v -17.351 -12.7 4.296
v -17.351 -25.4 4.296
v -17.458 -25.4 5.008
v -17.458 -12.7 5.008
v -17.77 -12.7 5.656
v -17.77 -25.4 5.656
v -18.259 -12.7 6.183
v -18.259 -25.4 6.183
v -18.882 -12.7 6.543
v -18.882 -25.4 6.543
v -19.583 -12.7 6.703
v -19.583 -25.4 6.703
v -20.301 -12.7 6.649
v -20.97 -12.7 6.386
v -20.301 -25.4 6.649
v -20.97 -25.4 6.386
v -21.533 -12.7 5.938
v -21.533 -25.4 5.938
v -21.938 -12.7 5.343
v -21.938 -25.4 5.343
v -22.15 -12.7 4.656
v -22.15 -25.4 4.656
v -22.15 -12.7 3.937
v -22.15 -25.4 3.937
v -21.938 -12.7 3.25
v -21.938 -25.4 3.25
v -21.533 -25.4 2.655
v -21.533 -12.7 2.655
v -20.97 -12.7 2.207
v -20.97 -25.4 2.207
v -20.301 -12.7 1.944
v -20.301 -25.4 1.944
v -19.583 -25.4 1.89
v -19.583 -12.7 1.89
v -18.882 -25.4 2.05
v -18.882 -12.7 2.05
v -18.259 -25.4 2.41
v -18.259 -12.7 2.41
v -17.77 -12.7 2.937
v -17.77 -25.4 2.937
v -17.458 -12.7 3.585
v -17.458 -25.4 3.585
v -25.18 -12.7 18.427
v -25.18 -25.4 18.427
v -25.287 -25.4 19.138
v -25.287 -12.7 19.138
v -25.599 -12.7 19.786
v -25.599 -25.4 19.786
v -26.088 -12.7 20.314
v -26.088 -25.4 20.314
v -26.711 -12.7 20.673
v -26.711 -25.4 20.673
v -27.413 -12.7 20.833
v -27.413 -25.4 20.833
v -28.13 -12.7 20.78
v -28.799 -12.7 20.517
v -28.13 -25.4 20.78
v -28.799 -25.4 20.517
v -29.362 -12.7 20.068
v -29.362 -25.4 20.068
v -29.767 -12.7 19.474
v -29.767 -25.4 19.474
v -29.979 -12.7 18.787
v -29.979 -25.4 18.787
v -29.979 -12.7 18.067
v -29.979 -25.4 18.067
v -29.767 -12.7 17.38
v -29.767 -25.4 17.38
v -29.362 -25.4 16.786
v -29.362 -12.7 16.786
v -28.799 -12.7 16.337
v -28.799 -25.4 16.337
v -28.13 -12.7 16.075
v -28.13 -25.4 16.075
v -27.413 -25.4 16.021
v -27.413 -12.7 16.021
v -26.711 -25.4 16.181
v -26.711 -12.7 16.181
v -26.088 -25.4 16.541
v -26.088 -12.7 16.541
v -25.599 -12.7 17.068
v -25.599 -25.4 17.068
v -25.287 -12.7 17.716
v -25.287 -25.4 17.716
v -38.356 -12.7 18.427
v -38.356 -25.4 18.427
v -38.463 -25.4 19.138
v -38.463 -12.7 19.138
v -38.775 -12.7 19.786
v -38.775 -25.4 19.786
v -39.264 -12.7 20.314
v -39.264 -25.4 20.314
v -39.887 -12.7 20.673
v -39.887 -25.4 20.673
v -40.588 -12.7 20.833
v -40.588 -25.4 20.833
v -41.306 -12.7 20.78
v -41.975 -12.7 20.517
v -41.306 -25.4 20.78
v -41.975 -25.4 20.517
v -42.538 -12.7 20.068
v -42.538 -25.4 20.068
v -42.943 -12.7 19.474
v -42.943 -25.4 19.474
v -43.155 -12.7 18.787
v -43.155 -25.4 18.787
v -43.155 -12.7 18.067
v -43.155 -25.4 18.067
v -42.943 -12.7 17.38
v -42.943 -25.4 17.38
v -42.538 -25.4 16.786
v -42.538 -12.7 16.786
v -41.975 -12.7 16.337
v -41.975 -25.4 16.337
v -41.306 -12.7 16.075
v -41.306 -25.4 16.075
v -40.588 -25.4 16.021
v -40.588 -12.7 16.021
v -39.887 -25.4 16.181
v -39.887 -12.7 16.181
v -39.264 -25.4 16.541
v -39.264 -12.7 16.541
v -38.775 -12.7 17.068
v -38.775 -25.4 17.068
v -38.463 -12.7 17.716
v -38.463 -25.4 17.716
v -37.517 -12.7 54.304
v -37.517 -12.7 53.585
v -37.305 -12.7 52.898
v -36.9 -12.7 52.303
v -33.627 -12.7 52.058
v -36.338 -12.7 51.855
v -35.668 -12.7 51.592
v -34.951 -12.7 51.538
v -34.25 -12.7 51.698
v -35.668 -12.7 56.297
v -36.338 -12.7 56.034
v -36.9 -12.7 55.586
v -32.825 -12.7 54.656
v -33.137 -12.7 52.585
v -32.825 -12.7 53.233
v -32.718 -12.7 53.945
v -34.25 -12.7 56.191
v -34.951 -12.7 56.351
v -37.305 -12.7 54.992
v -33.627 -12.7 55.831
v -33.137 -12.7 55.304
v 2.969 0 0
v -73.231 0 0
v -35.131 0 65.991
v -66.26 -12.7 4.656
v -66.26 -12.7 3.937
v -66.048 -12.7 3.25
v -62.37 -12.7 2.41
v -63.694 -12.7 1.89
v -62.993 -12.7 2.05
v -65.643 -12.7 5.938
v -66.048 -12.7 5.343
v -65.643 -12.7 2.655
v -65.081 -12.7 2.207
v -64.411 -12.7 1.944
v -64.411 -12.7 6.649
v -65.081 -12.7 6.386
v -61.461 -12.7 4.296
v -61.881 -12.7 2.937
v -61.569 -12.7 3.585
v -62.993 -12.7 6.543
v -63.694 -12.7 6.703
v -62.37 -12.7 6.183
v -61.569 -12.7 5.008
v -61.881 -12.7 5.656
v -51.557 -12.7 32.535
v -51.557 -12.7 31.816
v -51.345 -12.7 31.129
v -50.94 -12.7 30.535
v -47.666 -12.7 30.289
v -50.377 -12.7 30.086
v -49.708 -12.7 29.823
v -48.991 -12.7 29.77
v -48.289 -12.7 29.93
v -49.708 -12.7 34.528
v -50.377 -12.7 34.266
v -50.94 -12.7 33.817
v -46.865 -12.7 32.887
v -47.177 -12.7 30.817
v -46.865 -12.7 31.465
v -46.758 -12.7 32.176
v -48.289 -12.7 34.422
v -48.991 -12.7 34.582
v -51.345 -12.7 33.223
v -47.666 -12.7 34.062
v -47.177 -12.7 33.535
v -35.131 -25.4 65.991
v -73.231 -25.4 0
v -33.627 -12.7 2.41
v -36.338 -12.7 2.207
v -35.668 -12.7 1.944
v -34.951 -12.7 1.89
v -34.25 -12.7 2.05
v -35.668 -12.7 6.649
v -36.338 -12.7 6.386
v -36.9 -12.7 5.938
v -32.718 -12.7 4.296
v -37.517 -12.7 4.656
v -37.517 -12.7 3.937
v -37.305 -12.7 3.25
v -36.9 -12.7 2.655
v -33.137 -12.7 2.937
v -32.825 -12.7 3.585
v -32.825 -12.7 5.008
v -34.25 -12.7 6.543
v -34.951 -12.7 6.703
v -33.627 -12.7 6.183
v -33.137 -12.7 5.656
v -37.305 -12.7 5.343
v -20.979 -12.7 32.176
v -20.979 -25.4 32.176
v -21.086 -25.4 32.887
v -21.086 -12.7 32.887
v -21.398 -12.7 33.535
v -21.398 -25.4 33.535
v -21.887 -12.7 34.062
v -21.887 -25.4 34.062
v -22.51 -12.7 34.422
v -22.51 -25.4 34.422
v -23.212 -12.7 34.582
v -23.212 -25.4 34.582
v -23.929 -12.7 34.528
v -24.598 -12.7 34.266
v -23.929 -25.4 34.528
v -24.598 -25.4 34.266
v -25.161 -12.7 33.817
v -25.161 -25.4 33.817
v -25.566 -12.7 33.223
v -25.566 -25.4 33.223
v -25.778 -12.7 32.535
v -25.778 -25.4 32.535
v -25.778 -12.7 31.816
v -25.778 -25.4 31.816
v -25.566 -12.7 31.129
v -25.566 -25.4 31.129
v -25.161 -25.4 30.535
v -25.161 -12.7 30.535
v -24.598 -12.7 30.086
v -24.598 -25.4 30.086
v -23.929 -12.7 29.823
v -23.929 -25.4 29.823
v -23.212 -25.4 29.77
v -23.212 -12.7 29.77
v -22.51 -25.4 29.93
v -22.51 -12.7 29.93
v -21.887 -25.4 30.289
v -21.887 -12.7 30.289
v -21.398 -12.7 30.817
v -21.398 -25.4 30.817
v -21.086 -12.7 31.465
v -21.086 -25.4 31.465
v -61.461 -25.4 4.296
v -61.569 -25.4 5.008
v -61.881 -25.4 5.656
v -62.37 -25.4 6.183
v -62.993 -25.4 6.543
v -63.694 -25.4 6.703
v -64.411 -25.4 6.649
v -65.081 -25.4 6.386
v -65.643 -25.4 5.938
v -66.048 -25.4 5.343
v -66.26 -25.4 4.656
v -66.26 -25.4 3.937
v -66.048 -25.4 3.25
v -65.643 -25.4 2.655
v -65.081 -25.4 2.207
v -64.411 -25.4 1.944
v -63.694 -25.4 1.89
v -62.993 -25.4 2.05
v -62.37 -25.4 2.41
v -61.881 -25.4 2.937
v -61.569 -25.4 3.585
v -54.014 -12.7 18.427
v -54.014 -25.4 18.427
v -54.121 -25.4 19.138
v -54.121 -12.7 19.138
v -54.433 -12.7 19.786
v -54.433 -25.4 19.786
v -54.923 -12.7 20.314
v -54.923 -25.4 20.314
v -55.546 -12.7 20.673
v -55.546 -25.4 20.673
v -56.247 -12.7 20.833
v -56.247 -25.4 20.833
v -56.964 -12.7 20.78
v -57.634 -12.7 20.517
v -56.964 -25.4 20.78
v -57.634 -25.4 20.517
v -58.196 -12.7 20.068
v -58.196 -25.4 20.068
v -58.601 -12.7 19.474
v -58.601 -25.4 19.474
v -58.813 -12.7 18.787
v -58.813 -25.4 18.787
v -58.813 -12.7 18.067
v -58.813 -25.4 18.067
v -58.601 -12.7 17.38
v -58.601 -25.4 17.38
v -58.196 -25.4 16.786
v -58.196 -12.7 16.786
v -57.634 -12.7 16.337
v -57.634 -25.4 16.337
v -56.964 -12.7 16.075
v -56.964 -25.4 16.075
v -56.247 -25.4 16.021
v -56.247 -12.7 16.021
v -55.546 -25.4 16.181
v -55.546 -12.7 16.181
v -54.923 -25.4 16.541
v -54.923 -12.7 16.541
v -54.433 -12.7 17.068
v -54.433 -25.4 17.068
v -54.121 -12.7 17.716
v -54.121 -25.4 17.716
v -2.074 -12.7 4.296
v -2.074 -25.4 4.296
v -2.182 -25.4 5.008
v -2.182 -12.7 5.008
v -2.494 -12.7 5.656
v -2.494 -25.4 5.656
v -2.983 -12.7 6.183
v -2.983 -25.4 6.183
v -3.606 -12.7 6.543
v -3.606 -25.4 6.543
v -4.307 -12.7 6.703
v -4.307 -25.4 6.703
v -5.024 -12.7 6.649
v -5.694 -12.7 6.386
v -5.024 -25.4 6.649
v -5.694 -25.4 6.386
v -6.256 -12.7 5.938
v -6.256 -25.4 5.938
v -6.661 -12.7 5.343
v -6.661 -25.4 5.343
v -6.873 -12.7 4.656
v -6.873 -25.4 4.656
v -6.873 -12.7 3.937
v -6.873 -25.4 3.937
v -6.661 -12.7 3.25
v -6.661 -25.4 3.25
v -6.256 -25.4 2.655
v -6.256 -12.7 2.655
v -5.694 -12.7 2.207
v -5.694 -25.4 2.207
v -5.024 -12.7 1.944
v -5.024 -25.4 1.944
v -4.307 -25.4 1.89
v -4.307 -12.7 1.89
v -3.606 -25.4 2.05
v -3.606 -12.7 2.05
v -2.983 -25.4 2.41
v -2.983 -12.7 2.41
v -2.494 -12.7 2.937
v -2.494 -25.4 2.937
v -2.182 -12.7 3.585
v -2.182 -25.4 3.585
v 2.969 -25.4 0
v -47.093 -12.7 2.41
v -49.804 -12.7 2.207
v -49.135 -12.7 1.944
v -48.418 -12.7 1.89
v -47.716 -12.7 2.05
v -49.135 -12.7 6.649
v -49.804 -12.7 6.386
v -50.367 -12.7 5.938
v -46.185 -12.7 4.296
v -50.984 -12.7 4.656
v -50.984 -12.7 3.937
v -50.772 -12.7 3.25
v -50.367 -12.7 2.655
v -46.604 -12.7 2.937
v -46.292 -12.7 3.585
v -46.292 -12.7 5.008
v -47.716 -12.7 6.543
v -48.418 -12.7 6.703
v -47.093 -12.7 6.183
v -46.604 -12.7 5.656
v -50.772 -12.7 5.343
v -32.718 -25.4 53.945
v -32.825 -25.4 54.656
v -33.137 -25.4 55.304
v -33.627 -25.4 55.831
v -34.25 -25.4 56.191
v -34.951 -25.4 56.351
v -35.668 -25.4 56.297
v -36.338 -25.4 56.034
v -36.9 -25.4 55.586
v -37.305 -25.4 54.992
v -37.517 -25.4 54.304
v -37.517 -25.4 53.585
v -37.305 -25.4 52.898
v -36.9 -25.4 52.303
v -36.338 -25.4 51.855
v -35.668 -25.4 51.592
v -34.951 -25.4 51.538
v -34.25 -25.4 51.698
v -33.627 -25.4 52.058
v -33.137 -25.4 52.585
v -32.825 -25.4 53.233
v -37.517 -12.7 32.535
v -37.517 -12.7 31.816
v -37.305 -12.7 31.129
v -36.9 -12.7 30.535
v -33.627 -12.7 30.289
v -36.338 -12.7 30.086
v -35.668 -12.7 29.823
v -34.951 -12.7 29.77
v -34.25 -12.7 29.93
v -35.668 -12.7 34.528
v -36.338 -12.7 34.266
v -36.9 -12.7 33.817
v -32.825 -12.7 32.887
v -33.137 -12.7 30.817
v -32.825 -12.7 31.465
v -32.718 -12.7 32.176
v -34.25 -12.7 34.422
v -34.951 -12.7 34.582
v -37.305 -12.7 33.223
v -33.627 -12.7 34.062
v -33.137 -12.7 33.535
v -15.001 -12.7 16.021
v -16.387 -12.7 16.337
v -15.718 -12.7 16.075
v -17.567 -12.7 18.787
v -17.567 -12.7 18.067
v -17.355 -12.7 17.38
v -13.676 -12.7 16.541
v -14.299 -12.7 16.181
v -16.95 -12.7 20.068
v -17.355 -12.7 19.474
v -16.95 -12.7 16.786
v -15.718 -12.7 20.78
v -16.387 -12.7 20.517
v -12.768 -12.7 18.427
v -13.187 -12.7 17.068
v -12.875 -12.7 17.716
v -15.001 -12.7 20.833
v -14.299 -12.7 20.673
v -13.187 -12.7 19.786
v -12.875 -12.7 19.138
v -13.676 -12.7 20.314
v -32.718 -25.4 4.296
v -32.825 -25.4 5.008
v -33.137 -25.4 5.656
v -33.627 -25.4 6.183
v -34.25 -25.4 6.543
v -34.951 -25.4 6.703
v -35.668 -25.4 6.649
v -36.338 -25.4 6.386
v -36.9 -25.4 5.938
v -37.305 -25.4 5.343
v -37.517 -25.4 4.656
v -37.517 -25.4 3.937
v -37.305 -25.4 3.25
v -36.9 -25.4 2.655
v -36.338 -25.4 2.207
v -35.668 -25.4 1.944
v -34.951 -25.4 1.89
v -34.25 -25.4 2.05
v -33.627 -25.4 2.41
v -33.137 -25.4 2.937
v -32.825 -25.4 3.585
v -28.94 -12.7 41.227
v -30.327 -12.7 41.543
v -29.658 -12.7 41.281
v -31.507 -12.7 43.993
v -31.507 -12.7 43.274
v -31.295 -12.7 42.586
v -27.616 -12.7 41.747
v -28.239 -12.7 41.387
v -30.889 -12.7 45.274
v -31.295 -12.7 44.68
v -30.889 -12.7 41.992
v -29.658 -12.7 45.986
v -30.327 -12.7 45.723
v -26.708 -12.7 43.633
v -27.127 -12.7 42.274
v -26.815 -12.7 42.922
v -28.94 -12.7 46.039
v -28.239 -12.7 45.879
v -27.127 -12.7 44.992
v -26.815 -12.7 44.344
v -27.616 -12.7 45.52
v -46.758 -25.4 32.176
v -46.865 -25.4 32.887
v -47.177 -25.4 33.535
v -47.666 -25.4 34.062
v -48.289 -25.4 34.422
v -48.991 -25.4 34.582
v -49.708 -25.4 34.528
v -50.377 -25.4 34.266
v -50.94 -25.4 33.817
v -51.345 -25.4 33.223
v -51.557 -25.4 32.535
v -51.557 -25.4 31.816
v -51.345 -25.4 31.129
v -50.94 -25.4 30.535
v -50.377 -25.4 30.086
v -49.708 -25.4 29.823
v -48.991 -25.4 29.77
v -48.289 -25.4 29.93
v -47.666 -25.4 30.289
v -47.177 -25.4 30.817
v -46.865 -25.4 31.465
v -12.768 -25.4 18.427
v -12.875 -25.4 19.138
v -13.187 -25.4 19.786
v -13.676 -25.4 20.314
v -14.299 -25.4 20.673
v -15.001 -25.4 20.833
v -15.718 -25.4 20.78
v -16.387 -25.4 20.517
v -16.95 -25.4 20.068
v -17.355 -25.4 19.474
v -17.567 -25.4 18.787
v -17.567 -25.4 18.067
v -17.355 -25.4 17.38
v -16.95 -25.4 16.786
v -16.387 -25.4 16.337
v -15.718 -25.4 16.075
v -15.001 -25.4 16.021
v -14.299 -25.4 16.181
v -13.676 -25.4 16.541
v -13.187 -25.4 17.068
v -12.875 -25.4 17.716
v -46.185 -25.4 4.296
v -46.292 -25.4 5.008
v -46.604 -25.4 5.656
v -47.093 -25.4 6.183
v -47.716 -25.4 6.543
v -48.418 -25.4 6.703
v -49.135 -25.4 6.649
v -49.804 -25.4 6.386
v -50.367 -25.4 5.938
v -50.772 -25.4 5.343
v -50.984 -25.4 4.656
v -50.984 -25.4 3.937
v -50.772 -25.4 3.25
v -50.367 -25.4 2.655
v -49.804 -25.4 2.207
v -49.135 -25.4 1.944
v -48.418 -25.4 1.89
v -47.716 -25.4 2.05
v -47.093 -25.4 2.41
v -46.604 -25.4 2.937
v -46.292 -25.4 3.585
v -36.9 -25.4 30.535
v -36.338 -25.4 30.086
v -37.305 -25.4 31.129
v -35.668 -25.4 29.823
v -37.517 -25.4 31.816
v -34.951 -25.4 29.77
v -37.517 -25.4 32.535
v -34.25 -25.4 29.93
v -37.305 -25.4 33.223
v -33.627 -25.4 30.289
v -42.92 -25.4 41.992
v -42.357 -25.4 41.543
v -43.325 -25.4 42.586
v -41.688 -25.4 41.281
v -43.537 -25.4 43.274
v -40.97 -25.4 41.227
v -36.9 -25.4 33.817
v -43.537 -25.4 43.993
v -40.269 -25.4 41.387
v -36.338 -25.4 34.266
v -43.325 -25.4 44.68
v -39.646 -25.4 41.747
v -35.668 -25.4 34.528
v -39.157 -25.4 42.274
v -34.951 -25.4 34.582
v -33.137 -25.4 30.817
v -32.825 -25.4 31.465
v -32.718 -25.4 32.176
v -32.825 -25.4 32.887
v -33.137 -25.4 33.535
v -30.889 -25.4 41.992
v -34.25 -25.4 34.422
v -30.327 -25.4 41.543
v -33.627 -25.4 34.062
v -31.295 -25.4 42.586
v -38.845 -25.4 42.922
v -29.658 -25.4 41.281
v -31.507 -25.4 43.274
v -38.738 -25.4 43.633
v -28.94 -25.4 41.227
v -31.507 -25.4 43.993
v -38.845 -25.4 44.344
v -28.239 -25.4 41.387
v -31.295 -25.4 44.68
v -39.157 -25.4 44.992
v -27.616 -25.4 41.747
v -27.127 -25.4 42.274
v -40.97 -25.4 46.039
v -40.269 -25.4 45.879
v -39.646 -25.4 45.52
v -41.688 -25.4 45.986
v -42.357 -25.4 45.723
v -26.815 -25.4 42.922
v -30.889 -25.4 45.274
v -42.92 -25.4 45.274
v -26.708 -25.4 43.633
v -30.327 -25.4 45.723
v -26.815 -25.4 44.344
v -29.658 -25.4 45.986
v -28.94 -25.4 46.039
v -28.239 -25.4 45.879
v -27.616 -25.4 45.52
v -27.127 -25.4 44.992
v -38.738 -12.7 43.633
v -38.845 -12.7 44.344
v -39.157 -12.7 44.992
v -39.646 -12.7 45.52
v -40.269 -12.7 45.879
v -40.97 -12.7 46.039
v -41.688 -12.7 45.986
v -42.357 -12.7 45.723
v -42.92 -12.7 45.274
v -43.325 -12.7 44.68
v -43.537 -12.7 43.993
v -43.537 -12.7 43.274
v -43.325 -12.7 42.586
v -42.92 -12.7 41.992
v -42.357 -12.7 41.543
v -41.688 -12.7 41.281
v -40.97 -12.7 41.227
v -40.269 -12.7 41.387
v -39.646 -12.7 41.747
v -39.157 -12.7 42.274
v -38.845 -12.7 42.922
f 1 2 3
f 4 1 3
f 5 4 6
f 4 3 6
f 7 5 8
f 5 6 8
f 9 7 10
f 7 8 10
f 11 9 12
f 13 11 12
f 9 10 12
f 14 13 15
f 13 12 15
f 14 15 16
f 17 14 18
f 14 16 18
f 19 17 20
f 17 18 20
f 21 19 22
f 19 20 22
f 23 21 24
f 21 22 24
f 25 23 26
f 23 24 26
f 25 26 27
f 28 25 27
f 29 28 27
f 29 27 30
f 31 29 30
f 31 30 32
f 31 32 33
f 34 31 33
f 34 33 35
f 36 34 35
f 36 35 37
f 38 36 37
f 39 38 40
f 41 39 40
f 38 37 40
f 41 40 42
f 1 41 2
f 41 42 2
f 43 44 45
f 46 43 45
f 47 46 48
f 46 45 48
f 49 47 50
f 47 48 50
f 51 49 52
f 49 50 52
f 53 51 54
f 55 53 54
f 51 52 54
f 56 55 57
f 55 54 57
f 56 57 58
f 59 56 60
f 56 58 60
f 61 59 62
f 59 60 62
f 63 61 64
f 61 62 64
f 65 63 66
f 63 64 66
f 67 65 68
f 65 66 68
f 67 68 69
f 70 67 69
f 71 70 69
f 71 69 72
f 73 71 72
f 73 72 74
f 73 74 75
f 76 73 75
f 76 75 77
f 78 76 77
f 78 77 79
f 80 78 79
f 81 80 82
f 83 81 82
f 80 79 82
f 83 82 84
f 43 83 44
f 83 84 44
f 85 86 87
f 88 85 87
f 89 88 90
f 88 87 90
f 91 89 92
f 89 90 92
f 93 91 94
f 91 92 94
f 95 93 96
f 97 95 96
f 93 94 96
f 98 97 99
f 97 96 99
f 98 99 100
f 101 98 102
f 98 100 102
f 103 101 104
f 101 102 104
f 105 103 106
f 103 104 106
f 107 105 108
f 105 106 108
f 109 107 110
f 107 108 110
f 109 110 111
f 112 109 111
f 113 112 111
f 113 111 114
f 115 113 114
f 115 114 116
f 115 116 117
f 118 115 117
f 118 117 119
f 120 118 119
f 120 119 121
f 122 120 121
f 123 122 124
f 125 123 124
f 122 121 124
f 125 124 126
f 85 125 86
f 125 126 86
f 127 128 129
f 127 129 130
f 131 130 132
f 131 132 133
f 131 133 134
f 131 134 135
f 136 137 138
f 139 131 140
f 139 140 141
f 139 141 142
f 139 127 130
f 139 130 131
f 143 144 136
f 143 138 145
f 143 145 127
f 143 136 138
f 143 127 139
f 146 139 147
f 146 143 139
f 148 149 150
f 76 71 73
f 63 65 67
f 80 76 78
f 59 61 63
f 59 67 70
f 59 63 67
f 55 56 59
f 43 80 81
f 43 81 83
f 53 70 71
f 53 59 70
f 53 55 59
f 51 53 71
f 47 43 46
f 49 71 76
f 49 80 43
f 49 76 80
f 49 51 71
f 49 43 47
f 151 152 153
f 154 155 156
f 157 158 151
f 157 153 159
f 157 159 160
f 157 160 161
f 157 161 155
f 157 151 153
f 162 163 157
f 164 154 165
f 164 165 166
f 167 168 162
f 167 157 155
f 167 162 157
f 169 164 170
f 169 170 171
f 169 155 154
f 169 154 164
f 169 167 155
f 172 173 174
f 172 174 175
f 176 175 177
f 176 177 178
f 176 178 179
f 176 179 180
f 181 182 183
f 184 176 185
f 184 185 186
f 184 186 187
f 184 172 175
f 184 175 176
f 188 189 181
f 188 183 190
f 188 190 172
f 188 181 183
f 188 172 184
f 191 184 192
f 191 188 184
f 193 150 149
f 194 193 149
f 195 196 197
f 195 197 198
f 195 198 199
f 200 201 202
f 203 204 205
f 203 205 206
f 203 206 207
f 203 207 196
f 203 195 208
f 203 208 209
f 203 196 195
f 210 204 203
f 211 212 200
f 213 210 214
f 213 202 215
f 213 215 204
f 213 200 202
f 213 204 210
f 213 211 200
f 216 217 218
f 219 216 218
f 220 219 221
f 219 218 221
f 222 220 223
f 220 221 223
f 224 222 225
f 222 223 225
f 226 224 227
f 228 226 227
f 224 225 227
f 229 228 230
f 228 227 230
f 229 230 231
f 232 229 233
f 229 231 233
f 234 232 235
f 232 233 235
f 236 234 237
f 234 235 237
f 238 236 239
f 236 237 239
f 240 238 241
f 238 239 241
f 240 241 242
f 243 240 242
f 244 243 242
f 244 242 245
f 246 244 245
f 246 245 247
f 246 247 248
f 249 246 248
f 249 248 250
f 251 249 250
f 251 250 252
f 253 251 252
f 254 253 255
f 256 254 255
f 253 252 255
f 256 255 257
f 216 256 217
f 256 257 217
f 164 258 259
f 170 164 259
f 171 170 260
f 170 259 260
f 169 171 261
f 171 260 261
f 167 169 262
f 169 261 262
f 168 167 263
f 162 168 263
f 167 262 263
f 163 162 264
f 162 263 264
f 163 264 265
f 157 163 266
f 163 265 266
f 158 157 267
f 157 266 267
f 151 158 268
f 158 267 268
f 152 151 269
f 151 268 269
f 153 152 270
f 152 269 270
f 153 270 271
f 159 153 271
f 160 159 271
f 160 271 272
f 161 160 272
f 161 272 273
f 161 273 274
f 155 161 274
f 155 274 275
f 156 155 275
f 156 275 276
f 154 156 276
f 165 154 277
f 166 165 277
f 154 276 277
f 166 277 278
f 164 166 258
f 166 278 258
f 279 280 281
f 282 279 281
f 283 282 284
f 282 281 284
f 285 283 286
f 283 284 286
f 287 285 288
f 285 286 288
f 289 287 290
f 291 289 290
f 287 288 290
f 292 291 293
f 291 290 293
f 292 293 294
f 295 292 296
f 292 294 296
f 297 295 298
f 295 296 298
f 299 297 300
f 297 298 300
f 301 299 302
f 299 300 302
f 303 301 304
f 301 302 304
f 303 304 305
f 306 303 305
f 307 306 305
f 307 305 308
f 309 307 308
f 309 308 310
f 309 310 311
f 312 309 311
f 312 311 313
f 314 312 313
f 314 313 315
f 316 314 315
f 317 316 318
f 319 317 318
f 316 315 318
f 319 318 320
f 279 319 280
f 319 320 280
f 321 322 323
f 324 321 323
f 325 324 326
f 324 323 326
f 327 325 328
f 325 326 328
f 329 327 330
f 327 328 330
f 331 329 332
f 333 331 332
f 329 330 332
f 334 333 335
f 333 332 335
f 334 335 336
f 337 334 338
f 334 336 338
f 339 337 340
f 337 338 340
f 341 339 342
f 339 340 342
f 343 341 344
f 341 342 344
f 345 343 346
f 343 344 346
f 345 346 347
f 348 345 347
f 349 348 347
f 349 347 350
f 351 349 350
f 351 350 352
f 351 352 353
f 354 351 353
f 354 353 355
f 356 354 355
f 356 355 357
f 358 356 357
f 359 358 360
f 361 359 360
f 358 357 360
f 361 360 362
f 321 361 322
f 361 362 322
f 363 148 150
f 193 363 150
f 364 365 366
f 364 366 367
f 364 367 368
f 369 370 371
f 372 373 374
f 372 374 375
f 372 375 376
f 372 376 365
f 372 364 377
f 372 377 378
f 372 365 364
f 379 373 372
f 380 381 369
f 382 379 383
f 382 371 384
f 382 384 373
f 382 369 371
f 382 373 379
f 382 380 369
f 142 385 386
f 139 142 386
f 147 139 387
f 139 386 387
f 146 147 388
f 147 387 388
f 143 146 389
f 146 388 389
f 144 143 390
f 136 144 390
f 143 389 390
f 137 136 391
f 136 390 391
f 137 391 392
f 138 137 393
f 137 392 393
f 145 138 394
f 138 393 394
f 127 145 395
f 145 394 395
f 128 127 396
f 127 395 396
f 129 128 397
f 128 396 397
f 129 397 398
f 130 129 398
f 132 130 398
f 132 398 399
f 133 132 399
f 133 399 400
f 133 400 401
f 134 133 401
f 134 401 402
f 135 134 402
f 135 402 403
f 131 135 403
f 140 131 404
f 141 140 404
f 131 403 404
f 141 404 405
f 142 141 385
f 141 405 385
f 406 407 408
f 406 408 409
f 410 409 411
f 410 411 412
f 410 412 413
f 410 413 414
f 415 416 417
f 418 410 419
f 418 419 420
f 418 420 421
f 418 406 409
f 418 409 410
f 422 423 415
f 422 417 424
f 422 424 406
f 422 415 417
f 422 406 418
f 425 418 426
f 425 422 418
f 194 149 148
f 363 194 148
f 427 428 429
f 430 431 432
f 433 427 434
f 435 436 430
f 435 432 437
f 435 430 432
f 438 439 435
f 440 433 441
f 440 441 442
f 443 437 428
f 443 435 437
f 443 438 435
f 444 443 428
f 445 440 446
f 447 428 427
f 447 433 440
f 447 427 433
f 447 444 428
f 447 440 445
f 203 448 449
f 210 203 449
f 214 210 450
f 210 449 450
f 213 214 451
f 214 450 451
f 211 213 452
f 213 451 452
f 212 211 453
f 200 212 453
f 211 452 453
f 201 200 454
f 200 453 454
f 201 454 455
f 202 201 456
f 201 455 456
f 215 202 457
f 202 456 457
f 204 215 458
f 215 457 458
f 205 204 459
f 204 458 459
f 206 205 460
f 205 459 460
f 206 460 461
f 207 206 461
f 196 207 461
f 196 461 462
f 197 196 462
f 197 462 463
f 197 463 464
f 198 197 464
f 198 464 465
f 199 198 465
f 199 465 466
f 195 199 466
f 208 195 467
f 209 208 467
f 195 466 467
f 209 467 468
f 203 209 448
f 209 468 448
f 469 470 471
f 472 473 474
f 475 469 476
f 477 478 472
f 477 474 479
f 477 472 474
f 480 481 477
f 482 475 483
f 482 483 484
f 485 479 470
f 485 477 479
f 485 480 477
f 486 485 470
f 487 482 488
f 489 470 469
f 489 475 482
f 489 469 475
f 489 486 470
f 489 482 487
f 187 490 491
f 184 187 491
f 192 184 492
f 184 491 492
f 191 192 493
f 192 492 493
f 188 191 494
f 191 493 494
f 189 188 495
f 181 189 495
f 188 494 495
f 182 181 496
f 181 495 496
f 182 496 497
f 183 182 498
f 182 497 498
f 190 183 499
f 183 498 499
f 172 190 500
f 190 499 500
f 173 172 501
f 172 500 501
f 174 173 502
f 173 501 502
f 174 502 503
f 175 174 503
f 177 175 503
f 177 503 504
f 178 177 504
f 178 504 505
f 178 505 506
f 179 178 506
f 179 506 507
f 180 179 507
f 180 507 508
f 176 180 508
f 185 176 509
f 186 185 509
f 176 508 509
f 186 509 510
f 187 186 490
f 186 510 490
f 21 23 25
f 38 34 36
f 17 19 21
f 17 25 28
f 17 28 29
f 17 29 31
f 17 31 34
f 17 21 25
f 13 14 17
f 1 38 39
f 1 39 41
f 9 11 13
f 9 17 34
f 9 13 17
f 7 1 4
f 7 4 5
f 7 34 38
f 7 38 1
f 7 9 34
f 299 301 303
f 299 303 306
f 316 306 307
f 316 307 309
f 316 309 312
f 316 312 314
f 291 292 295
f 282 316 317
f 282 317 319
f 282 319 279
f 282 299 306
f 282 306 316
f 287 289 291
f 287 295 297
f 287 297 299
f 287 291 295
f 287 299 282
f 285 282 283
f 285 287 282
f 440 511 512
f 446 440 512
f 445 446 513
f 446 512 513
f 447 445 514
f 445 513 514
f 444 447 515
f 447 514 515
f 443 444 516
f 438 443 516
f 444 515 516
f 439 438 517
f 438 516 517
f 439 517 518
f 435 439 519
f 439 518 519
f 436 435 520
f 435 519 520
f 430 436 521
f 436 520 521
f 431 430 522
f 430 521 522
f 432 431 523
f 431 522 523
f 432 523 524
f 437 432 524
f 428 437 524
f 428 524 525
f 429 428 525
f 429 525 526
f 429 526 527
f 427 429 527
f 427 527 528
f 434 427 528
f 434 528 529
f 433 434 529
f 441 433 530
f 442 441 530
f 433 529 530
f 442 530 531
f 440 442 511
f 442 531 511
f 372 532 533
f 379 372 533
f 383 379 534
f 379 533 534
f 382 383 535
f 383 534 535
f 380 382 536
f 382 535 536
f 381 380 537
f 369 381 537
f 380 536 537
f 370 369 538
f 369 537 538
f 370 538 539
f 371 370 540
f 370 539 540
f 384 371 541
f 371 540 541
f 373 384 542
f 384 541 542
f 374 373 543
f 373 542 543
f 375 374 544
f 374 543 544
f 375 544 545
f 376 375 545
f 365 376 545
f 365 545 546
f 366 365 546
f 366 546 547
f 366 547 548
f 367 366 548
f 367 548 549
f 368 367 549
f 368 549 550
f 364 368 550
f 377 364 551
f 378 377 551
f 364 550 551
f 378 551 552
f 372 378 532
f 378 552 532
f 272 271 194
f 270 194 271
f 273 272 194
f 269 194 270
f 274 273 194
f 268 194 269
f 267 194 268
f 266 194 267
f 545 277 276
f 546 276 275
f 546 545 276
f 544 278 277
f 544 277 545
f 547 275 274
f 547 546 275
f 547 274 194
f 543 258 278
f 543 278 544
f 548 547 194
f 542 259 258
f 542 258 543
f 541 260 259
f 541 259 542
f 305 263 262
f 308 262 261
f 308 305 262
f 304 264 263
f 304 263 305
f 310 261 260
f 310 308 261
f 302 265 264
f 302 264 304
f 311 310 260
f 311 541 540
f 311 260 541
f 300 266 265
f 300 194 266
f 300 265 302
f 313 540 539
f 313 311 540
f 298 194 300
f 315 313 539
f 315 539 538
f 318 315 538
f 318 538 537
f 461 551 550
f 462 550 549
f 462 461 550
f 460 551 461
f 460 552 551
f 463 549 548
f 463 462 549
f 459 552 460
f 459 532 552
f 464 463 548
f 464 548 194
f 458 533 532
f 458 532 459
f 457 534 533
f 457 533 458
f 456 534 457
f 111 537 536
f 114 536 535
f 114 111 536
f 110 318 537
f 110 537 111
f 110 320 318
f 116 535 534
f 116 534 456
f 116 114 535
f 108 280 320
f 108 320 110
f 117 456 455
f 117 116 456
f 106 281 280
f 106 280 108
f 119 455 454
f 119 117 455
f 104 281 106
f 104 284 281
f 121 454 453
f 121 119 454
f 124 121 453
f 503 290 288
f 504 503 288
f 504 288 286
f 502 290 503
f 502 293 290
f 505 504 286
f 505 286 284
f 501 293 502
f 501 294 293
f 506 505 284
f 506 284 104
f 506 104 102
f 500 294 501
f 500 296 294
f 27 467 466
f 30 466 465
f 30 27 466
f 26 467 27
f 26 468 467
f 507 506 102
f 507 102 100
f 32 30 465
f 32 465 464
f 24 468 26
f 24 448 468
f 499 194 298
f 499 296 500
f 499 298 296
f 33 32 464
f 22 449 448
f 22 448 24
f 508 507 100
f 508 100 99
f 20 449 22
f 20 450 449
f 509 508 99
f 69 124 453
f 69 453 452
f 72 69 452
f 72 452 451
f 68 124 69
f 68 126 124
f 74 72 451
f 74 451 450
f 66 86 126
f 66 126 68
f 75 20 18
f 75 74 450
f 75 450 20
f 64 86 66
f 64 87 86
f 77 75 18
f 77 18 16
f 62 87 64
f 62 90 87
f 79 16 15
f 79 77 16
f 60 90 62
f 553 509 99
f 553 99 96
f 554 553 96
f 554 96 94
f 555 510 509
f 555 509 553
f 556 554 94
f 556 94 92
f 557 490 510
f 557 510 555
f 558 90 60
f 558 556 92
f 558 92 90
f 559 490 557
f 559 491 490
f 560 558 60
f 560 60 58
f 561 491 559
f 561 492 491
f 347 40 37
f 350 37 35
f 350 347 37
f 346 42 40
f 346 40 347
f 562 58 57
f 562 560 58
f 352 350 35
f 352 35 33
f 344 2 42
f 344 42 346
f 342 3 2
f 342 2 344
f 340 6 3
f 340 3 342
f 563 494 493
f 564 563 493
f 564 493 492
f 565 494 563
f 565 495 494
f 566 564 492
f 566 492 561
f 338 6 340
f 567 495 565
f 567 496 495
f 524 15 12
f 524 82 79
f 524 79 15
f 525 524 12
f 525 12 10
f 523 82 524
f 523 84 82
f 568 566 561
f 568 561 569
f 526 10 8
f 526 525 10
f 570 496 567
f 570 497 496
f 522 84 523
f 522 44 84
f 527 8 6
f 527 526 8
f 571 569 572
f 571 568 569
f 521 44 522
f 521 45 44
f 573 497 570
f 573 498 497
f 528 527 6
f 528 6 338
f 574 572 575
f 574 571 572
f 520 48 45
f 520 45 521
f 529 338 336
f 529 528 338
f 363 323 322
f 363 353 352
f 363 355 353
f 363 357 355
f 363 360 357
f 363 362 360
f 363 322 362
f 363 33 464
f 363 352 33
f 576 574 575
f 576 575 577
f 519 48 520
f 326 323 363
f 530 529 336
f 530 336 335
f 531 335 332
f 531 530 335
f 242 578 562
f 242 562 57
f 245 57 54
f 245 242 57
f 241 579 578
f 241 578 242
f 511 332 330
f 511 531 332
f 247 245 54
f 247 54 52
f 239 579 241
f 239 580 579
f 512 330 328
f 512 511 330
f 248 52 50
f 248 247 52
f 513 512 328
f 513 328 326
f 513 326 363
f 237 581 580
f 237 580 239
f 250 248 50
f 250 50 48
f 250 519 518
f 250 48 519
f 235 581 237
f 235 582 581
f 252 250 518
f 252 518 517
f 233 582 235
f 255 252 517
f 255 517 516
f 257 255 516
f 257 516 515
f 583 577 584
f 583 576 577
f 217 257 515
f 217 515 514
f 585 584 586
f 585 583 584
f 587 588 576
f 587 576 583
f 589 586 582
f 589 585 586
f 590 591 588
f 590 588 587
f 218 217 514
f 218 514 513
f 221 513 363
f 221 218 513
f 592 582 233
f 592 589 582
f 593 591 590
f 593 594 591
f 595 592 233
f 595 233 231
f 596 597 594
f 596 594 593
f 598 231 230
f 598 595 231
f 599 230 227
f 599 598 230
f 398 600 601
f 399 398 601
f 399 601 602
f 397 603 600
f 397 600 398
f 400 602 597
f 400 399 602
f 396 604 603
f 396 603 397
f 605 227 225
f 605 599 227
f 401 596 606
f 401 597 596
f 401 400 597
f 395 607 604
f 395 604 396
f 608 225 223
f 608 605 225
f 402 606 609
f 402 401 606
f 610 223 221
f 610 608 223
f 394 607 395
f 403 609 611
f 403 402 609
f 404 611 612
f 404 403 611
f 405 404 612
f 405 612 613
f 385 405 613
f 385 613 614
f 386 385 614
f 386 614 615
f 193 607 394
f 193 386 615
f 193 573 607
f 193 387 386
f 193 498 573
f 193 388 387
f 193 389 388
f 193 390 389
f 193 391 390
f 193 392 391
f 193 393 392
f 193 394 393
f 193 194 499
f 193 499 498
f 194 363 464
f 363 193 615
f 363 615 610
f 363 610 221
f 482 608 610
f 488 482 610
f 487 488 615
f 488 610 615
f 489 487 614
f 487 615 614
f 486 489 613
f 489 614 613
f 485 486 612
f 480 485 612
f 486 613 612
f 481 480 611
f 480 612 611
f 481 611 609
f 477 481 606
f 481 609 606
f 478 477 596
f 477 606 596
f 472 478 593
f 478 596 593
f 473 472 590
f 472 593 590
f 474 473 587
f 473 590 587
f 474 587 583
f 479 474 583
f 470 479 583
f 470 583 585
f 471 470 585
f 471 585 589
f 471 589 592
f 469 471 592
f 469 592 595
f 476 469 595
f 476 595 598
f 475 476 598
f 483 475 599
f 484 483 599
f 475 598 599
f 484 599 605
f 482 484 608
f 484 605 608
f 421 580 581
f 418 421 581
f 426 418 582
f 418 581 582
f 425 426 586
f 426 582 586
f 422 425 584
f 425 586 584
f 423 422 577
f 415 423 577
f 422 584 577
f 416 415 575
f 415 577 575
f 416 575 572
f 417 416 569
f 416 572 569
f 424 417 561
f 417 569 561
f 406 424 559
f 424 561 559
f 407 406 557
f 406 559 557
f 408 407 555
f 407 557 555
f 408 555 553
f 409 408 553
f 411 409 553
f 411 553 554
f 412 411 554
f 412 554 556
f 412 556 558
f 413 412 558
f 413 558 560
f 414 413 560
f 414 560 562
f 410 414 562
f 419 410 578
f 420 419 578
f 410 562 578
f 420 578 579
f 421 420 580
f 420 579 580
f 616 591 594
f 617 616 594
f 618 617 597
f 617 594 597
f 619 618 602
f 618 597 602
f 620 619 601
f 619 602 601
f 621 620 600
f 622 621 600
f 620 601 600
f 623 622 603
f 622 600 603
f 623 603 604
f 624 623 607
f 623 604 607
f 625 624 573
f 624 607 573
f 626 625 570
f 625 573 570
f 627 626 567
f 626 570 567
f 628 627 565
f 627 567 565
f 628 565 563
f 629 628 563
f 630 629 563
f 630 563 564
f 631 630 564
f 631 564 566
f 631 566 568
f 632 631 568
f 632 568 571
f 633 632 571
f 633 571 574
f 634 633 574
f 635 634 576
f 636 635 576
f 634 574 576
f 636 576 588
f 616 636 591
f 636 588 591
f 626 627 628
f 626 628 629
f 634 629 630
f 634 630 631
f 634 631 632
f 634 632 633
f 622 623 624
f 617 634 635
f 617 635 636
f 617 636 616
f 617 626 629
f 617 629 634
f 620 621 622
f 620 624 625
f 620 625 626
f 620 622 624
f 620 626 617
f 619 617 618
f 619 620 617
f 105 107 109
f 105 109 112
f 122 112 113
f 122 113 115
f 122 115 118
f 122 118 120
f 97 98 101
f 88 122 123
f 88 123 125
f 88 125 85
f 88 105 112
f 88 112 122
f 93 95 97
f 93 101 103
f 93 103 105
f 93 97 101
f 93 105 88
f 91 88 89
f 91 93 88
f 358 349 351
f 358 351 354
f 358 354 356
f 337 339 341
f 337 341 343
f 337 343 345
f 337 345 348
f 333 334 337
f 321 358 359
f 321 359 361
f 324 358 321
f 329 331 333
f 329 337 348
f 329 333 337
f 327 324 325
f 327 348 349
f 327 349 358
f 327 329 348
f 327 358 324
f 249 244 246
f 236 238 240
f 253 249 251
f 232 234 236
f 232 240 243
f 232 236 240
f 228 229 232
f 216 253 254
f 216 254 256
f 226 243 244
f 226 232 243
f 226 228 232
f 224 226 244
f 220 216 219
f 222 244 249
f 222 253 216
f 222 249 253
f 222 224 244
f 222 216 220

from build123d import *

# Parameters (mm, degrees)
F1_DEPTH = 25.4
F2_R     = 2.413
F3_DEPTH = 12.7
F4_R     = 2.413
F5_DEPTH = 12.7


with BuildPart() as f1:
    # F0 (on Front) → F1 (new body)
    with BuildSketch(Plane.XZ):
        Polygon((-35.131108, 65.991136), (-73.231108, 0), (2.968892, 0), align=None)
    extrude(amount=F1_DEPTH)

    # F2 (on face) → F3 (cut)
    with BuildSketch(Plane.XZ.offset(25.4)):
        with Locations((-63.874334, 4.29648)):
            Circle(F2_R)
        with Locations((-48.597958, 4.29648)):
            Circle(F2_R)
        with Locations((-35.131108, 4.29648)):
            Circle(F2_R)
        with Locations((-19.763807, 4.29648)):
            Circle(F2_R)
        with Locations((-4.487435, 4.29648)):
            Circle(F2_R)
    extrude(amount=-F3_DEPTH, mode=Mode.SUBTRACT)

    # F4 (on face) → F5 (cut)
    with BuildSketch(Plane.XZ.offset(25.4)):
        with Locations((-56.427099, 18.427124)):
            Circle(F4_R)
        with Locations((-40.768821, 18.427124)):
            Circle(F4_R)
        with Locations((-27.592948, 18.427124)):
            Circle(F4_R)
        with Locations((-15.180895, 18.427124)):
            Circle(F4_R)
        with Locations((-23.391945, 32.175861)):
            Circle(F4_R)
        with Locations((-35.131108, 32.175861)):
            Circle(F4_R)
        with Locations((-49.170826, 32.175861)):
            Circle(F4_R)
        with Locations((-41.15073, 43.633141)):
            Circle(F4_R)
        with Locations((-29.120585, 43.633141)):
            Circle(F4_R)
        with Locations((-35.131108, 53.944688)):
            Circle(F4_R)
    extrude(amount=-F5_DEPTH, mode=Mode.SUBTRACT)


solid = f1.part
